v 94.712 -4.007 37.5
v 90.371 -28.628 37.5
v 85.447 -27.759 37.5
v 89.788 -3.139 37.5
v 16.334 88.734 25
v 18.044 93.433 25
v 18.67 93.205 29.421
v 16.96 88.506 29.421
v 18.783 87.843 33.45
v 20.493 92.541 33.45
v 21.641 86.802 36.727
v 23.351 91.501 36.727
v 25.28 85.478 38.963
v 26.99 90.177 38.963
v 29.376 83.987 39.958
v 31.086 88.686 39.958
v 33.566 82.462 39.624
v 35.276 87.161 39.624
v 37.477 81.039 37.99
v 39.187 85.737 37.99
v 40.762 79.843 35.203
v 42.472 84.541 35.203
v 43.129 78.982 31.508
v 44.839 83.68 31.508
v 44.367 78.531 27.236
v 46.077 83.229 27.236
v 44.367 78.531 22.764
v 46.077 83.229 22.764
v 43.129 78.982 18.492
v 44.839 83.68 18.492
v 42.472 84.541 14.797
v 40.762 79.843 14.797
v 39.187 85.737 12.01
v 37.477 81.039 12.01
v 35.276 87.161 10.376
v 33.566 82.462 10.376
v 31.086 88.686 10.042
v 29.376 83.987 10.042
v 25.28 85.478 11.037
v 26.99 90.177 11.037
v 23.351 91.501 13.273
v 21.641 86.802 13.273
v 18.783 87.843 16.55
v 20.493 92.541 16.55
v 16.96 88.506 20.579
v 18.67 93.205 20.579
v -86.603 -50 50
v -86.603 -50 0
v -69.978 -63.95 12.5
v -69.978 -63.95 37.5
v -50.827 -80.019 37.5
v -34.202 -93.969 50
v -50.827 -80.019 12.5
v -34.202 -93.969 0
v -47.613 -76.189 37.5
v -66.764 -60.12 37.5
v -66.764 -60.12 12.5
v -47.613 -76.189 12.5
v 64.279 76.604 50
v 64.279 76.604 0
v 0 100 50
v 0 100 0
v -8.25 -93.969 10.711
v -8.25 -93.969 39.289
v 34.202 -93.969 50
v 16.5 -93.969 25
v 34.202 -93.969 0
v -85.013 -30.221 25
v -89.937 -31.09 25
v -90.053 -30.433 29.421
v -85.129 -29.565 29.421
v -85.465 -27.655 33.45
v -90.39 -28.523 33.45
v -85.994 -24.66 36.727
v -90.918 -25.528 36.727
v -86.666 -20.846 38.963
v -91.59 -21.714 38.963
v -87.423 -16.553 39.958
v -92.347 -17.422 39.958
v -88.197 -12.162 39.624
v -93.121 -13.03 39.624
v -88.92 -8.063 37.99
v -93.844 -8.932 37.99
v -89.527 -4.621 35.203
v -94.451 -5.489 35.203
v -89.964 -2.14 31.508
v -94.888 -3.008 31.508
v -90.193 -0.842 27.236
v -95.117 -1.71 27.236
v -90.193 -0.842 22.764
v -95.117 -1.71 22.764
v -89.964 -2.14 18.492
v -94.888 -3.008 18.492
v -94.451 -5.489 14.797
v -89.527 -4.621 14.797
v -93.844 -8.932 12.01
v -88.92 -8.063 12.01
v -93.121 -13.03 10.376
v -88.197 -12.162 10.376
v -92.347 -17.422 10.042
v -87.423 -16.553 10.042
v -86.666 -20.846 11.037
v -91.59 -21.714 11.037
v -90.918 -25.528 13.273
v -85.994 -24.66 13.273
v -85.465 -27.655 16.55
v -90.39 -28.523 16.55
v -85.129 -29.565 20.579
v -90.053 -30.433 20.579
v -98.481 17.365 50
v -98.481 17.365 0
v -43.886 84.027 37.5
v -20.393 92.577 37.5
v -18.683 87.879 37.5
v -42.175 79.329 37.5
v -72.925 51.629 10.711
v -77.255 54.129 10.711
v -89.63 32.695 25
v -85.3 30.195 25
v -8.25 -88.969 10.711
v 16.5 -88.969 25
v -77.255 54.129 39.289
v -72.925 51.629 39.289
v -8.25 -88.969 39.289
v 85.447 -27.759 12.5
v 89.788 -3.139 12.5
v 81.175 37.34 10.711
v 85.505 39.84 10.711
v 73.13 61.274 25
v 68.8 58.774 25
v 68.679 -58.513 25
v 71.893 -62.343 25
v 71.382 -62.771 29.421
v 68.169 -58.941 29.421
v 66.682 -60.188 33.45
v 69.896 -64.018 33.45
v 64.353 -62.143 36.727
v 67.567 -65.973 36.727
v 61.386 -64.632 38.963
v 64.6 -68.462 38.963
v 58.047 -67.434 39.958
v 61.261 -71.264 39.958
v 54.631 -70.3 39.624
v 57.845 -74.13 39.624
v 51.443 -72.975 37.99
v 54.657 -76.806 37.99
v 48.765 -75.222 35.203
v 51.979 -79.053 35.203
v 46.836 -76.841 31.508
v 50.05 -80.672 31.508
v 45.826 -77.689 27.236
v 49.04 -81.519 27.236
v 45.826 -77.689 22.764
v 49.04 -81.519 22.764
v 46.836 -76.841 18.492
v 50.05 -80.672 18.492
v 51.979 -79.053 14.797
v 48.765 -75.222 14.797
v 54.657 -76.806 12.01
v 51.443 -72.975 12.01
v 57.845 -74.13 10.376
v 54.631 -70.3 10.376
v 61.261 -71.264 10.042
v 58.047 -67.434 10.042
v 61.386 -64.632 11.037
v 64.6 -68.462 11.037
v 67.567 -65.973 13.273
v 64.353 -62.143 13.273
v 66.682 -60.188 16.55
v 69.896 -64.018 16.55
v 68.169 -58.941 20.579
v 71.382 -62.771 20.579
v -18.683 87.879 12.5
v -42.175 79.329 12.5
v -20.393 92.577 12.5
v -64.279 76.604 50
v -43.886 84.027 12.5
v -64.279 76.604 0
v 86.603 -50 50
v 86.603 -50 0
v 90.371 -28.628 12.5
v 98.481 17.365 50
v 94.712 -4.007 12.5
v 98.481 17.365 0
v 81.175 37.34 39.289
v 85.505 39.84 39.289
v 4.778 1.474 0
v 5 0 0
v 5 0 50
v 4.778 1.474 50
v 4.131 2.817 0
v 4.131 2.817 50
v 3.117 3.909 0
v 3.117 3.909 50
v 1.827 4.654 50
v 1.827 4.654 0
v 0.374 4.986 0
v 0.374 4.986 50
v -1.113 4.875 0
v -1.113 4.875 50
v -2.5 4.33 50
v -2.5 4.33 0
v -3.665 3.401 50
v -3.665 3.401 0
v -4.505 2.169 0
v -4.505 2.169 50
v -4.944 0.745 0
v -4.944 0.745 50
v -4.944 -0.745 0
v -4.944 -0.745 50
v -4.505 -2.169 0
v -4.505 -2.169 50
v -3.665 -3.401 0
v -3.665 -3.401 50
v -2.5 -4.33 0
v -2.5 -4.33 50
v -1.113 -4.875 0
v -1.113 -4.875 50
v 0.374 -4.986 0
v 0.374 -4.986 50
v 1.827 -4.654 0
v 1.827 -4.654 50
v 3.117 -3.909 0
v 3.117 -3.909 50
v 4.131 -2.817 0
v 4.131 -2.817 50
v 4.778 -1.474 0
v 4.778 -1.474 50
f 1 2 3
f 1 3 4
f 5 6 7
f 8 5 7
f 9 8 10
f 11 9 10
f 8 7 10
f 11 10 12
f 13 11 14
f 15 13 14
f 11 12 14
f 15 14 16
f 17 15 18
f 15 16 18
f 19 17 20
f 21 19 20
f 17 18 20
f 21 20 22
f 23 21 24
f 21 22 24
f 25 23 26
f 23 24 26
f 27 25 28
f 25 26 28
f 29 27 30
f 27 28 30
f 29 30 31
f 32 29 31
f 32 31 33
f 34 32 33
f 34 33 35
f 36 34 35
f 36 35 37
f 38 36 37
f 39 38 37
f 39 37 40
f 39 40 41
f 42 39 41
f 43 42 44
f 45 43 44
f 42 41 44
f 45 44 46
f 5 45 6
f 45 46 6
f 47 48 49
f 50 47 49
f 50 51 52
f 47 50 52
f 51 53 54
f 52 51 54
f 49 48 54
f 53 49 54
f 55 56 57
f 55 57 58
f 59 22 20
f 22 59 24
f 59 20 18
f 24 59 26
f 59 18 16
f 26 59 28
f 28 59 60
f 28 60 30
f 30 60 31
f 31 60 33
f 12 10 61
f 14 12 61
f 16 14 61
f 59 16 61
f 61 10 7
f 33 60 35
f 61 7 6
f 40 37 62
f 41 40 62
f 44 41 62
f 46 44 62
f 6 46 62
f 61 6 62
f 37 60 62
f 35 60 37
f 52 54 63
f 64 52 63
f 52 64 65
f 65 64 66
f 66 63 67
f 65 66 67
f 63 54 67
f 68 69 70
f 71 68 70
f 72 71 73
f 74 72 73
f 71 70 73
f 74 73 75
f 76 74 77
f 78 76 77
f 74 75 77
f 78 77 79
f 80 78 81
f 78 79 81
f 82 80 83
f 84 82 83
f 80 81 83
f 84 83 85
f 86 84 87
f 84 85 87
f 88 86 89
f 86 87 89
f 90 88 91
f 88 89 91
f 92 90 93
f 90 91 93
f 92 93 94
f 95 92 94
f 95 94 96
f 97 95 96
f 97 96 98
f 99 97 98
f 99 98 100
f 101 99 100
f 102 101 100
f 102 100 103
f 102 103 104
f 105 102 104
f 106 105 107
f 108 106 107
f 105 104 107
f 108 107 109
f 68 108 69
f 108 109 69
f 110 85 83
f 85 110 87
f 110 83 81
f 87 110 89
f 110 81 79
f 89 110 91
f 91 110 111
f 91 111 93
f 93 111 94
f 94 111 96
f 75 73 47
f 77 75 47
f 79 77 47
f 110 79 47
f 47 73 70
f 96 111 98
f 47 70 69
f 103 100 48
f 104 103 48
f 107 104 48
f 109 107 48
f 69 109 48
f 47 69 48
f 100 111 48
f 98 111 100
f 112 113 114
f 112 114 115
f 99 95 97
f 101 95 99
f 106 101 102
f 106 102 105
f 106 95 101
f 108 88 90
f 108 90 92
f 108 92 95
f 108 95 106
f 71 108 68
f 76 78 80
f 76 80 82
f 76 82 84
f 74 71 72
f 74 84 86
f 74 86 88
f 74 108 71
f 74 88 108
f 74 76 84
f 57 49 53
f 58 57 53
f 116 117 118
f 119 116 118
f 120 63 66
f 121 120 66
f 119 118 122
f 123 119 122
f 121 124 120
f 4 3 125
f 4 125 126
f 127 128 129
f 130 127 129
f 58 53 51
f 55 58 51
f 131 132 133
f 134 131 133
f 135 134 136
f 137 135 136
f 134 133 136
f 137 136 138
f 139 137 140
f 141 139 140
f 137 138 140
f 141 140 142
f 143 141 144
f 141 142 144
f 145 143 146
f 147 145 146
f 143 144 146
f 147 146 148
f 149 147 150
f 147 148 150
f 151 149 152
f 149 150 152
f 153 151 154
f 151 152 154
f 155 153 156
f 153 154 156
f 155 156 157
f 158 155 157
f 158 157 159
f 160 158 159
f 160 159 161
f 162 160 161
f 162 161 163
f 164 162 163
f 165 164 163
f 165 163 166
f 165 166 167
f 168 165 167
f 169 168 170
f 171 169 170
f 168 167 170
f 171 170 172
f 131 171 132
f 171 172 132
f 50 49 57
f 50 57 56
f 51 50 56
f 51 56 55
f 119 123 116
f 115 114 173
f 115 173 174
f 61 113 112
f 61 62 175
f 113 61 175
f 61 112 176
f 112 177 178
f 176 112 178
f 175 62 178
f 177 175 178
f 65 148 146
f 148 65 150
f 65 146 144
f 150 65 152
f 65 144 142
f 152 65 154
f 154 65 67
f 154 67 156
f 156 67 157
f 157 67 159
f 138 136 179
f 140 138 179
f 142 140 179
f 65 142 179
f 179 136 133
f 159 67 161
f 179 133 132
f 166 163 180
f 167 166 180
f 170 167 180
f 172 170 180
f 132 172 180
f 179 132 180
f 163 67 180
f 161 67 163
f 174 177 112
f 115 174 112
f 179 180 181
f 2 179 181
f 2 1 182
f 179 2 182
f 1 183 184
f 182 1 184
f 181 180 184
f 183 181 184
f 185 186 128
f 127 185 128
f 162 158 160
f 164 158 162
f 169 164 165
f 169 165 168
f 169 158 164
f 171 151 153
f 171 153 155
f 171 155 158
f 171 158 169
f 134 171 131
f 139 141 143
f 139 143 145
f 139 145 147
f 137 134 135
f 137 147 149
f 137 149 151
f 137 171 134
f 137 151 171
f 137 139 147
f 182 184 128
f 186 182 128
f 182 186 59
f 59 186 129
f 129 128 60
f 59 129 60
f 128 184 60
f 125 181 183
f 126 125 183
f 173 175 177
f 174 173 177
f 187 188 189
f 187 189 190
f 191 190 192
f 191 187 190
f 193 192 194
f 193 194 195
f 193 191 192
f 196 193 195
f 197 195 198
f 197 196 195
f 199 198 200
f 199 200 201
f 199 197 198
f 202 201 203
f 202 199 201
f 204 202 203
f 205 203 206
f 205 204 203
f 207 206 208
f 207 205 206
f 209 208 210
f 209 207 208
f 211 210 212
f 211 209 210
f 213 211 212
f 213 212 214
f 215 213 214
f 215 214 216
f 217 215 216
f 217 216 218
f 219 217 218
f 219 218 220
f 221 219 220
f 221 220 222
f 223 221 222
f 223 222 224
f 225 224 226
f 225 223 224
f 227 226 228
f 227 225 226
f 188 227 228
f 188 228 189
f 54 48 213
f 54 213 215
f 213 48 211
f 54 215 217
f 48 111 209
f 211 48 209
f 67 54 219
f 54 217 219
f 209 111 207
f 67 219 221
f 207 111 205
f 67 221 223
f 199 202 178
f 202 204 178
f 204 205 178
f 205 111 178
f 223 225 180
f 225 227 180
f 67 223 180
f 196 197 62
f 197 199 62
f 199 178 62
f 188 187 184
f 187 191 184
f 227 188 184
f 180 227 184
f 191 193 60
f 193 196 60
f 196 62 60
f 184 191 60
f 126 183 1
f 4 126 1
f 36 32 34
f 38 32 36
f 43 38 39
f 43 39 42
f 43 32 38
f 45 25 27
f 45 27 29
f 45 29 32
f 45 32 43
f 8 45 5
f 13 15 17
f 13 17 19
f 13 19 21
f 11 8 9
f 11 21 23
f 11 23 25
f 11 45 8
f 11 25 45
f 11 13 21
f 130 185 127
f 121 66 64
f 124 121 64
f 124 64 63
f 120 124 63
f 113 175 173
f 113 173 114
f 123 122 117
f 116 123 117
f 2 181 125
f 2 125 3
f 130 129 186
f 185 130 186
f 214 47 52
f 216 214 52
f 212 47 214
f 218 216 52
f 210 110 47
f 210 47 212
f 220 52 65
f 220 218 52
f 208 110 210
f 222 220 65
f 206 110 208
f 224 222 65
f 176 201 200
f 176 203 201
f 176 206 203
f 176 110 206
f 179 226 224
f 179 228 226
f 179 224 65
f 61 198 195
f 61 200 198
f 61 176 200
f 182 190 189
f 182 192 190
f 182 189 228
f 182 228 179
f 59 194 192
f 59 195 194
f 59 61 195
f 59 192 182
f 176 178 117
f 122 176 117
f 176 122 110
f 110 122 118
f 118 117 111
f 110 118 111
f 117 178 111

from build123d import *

# Parameters (mm, degrees)
F0_R            = 5
F1_DEPTH        = 50
F2_R            = 15
F3_DEPTH        = 5
F3_COPIES_COUNT = 3
F4_W            = 25
F4_H            = 25
F5_DEPTH        = 5
F5_COPIES_COUNT = 3
F7_DEPTH        = 5
F7_COPIES_COUNT = 3


# Not quite as in the source:
# - a pattern or mirror of a feature is missing from the dataset's text; its kind, count and spacing are read off the source's solid


with BuildPart() as f1:
    # F0 (on Top) → F1 (new body)
    with BuildSketch(Plane.XY):
        Polygon((64.2787609687, 76.6044443119), (0, 100), (-64.2787609687, 76.6044443119), (-98.4807753012, 17.3648177667), (-86.6025403784, -50), (-34.2020143326, -93.9692620786), (34.2020143326, -93.9692620786), (86.6025403784, -50), (98.4807753012, 17.3648177667), align=None)
        Circle(F0_R, mode=Mode.SUBTRACT)
    extrude(amount=F1_DEPTH)

    # F2 (on face) → F3 (cut)
    with BuildSketch(Plane(origin=(60.4022773555, -71.9846310393, 0), x_dir=(0.7660444431, 0.6427876097, 0), z_dir=(0.6427876097, -0.7660444431, 0))):
        with Locations((0, 25)):
            Circle(F2_R)
    f3 = extrude(amount=-F3_DEPTH, mode=Mode.SUBTRACT)

    # F3_copies: F3 ×3 about axis
    f3_copies_axis = Axis((0, 0, 0), (0, 0, 1))
    for i in range(1, F3_COPIES_COUNT):
        add(f3.rotate(f3_copies_axis, i * 360 / F3_COPIES_COUNT), mode=Mode.SUBTRACT)

    # F4 (on face) → F5 (cut)
    with BuildSketch(Plane(origin=(-60.4022773555, -71.9846310393, 0), x_dir=(0.7660444431, -0.6427876097, 0), z_dir=(-0.6427876097, -0.7660444431, 0))):
        with Locations((0, 25)):
            Rectangle(F4_W, F4_H)
    f5 = extrude(amount=-F5_DEPTH, mode=Mode.SUBTRACT)

    # F5_copies: F5 ×3 about axis
    f5_copies_axis = Axis((0, 0, 0), (0, 0, 1))
    for i in range(1, F5_COPIES_COUNT):
        add(f5.rotate(f5_copies_axis, i * 360 / F5_COPIES_COUNT), mode=Mode.SUBTRACT)

    # F6 (on face) → F7 (cut)
    with BuildSketch(Plane.XZ.offset(93.9692620786)):
        Polygon((-8.25, 10.7105808376), (16.5, 25), (-8.25, 39.2894191624), align=None)
    f7 = extrude(amount=-F7_DEPTH, mode=Mode.SUBTRACT)

    # F7_copies: F7 ×3 about axis
    f7_copies_axis = Axis((0, 0, 0), (0, 0, 1))
    for i in range(1, F7_COPIES_COUNT):
        add(f7.rotate(f7_copies_axis, i * 360 / F7_COPIES_COUNT), mode=Mode.SUBTRACT)


solid = f1.part
